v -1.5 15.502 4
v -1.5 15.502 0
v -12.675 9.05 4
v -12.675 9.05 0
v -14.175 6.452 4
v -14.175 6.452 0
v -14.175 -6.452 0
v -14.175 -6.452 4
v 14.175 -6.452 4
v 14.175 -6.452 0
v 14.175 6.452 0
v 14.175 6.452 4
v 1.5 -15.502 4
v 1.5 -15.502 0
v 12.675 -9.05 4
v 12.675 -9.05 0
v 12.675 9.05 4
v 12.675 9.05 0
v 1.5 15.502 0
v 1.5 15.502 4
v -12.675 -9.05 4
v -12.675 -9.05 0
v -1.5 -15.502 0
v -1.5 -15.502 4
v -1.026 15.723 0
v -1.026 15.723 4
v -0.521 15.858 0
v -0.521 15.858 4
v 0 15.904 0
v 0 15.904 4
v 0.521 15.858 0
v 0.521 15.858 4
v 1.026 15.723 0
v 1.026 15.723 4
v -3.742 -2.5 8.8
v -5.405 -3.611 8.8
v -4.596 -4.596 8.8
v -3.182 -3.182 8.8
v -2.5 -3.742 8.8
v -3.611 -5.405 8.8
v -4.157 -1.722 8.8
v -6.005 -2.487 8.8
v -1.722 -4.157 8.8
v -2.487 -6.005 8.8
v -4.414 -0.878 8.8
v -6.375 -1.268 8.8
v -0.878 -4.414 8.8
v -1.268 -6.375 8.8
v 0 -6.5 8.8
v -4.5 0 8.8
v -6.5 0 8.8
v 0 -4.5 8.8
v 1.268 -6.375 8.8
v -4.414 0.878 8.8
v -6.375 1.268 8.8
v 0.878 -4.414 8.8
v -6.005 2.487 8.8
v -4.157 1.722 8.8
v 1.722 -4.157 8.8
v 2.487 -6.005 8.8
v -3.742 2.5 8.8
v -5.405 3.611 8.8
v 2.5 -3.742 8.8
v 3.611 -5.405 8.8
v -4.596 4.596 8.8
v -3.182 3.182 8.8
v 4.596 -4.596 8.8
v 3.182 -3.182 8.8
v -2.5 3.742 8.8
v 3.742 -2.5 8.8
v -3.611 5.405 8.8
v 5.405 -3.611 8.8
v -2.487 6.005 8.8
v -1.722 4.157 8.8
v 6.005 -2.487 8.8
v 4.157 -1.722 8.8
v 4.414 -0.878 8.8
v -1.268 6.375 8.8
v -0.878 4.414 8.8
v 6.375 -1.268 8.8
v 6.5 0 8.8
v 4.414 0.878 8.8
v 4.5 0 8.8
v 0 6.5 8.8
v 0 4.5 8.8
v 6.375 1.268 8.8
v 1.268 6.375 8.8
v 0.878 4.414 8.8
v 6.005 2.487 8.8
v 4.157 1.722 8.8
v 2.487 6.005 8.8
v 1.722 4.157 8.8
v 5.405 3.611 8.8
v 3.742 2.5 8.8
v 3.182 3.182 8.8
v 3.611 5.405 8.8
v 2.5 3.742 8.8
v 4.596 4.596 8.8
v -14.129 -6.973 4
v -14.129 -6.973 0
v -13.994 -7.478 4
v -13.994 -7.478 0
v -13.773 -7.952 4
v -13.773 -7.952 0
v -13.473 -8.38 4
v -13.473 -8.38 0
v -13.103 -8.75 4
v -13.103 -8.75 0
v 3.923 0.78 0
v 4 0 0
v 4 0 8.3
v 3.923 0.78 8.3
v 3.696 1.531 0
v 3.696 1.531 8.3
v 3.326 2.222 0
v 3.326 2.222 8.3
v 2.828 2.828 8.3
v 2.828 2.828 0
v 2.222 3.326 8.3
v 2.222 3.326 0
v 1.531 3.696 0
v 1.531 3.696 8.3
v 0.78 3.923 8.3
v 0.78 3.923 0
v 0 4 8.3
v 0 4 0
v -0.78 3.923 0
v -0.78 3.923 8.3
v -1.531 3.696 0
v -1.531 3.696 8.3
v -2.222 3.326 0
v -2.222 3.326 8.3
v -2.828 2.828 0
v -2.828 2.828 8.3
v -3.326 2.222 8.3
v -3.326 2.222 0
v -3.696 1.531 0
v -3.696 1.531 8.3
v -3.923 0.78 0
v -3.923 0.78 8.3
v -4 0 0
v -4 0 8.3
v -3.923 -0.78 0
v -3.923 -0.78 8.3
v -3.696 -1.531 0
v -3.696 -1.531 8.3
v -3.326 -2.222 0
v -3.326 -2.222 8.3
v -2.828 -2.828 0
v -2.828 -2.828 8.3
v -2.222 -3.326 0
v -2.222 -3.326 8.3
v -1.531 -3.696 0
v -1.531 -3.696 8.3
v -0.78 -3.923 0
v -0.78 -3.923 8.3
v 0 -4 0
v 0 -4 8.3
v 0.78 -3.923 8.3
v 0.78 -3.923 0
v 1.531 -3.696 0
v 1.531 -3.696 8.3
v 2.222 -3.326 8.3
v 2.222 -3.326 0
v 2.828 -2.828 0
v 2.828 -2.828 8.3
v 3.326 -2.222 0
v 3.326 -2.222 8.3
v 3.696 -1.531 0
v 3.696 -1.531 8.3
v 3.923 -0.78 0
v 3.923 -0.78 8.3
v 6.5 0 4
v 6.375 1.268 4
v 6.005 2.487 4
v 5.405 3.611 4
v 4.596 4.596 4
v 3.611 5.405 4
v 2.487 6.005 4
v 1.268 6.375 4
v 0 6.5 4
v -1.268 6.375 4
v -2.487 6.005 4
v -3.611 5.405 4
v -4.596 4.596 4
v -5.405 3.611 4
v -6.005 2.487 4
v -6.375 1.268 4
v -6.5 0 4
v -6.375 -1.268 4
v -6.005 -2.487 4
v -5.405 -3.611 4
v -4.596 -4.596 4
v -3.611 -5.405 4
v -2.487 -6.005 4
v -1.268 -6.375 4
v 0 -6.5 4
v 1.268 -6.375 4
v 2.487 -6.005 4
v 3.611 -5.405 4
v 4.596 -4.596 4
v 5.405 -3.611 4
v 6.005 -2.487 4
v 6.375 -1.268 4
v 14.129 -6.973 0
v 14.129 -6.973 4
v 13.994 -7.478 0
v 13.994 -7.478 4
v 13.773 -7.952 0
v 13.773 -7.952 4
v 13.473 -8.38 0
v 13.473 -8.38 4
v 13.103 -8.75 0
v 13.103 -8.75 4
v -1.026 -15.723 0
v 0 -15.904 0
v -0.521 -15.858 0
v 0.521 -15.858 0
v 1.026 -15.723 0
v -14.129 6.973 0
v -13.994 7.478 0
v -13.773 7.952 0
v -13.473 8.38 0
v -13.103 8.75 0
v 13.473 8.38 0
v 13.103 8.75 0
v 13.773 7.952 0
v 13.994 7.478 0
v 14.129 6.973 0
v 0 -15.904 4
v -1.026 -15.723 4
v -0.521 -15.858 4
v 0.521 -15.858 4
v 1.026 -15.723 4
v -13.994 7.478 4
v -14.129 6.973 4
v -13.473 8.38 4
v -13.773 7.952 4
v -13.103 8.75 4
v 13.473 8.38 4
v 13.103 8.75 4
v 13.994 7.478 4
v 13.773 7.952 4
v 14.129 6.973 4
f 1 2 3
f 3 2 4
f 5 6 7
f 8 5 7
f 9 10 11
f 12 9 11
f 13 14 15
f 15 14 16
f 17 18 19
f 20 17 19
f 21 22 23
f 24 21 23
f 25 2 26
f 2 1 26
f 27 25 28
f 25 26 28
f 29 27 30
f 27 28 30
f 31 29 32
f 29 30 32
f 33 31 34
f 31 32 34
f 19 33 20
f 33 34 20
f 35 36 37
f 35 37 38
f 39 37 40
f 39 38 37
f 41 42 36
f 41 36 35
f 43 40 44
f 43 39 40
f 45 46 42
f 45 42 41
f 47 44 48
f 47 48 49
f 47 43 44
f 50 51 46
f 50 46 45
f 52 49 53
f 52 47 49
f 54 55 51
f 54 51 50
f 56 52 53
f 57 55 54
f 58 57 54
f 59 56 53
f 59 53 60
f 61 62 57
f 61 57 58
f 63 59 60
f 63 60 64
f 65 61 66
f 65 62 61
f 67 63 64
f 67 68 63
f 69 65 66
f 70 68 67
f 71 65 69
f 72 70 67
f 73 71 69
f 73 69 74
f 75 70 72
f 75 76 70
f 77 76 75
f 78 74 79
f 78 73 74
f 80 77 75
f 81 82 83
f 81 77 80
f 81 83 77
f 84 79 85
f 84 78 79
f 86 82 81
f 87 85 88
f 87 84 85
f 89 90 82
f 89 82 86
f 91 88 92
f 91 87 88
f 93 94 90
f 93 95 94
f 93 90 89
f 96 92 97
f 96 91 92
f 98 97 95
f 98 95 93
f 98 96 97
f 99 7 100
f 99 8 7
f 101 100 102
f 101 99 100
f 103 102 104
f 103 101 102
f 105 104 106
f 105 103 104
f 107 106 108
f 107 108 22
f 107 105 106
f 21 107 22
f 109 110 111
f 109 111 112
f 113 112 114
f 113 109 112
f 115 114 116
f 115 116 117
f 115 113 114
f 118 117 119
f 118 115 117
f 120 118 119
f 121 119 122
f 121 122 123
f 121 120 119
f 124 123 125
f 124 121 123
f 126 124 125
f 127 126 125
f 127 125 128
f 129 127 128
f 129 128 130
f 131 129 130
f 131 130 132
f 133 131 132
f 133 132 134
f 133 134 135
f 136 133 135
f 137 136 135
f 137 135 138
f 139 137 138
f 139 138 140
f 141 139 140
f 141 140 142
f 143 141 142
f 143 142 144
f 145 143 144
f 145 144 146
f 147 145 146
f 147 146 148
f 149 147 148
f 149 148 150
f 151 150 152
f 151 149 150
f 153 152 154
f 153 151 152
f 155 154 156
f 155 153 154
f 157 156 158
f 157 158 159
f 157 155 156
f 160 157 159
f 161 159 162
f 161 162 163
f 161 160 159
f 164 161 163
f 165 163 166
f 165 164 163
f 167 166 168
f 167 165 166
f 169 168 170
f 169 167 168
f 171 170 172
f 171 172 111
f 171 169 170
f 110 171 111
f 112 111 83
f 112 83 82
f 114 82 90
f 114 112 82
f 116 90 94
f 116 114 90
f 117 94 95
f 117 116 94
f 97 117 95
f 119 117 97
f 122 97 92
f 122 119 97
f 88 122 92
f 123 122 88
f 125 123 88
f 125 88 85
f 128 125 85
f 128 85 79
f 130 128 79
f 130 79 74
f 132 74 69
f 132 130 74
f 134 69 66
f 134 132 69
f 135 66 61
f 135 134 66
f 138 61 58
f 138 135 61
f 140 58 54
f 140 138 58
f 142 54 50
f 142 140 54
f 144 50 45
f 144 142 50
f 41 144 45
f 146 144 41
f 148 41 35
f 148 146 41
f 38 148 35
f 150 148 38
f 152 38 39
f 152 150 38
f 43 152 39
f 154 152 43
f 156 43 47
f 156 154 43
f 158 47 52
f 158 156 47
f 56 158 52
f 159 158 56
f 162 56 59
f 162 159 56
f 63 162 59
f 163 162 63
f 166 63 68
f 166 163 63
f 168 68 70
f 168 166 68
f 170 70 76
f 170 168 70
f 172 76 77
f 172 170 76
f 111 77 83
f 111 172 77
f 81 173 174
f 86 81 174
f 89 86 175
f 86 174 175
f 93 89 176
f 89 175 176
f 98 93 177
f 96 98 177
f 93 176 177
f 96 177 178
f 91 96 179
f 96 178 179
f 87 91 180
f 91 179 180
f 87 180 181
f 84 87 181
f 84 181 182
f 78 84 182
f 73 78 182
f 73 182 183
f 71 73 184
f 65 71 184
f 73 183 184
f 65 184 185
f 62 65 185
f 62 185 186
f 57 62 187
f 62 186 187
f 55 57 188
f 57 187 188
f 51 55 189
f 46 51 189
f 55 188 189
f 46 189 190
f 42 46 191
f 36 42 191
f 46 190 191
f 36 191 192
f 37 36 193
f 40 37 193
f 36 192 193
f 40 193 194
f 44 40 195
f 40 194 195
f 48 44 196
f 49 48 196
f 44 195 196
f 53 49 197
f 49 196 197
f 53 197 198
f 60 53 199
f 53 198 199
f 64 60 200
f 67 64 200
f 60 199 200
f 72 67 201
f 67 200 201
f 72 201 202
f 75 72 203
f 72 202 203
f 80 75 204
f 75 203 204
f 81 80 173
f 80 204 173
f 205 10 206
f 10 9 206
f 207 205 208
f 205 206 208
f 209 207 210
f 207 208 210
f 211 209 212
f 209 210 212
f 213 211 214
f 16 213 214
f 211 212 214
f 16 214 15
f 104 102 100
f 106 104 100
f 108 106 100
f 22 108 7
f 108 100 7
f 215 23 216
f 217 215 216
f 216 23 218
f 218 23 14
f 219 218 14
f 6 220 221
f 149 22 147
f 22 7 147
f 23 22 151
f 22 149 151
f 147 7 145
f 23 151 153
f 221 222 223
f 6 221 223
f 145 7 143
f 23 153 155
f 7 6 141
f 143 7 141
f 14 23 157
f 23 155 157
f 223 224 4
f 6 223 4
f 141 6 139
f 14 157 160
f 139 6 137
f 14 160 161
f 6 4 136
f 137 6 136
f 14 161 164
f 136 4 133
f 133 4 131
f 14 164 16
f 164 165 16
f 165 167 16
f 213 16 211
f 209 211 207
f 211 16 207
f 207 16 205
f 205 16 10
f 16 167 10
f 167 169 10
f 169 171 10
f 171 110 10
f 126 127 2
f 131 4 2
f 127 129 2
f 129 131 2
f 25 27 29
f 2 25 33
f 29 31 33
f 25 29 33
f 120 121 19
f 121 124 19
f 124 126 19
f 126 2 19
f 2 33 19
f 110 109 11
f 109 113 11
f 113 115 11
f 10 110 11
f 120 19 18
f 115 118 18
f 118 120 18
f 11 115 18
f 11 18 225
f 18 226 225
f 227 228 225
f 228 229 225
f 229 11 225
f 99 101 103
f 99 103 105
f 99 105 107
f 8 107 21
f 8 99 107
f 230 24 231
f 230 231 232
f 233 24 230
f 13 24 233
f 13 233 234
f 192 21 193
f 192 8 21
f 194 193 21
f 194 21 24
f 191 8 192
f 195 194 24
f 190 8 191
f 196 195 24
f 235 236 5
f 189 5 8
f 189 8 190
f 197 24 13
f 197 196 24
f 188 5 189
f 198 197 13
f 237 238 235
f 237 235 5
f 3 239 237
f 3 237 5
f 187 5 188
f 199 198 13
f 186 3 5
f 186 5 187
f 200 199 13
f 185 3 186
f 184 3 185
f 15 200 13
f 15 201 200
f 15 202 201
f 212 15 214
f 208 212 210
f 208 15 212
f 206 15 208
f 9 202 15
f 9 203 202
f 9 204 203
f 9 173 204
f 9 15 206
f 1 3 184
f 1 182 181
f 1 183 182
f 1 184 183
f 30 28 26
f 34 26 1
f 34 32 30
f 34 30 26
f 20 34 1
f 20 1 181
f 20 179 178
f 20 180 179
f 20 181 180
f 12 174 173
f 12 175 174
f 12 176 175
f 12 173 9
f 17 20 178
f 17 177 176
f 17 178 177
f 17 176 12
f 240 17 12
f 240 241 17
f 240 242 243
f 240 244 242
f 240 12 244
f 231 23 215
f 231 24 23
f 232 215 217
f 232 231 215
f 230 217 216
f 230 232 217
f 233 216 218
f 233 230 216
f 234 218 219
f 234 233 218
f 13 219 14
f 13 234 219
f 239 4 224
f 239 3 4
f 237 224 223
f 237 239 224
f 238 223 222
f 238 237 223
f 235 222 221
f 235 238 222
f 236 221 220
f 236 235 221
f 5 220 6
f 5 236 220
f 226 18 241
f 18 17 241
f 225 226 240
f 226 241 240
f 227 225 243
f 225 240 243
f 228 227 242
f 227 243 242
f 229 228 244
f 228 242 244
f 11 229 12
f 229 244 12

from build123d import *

# Parameters (mm, degrees)
SKETCH_R      = 4
PAD_DEPTH     = 4
SKETCH001_R   = 6.5
SKETCH001_R_2 = 4
PAD001_DEPTH  = 4.8
CHAMFER_SIZE  = 0.5
FILLET_R      = 3


with BuildPart() as part:
    # Sketch → Pad (new body)
    with BuildSketch(Plane.XY):
        Polygon((0, 16.36788), (-14.175, 8.18394), (-14.175, -8.18394), (0, -16.36788), (14.175, -8.18394), (14.175, 8.18394), align=None)
        Circle(SKETCH_R, mode=Mode.SUBTRACT)
    extrude(amount=PAD_DEPTH)

    # Sketch001 (on Face9 of Pad) → Pad001 (join)
    with BuildSketch(Plane.XY.offset(4)):
        Circle(SKETCH001_R)
        Circle(SKETCH001_R_2, mode=Mode.SUBTRACT)
    extrude(amount=PAD001_DEPTH)

    # Chamfer
    chamfer_edges = [part.edges().sort_by_distance(p)[0] for p in [
        (-4, 0, 8.8),
    ]]
    chamfer(chamfer_edges, length=CHAMFER_SIZE)

    # Fillet
    fillet_edges = [part.edges().sort_by_distance(p)[0] for p in [
        (0, -16.36788, 2),
        (14.175, -8.18394, 2),
        (14.175, 8.18394, 2),
        (-14.175, -8.18394, 2),
        (-14.175, 8.18394, 2),
        (0, 16.36788, 2),
    ]]
    fillet(fillet_edges, radius=FILLET_R)


solid = part.part
